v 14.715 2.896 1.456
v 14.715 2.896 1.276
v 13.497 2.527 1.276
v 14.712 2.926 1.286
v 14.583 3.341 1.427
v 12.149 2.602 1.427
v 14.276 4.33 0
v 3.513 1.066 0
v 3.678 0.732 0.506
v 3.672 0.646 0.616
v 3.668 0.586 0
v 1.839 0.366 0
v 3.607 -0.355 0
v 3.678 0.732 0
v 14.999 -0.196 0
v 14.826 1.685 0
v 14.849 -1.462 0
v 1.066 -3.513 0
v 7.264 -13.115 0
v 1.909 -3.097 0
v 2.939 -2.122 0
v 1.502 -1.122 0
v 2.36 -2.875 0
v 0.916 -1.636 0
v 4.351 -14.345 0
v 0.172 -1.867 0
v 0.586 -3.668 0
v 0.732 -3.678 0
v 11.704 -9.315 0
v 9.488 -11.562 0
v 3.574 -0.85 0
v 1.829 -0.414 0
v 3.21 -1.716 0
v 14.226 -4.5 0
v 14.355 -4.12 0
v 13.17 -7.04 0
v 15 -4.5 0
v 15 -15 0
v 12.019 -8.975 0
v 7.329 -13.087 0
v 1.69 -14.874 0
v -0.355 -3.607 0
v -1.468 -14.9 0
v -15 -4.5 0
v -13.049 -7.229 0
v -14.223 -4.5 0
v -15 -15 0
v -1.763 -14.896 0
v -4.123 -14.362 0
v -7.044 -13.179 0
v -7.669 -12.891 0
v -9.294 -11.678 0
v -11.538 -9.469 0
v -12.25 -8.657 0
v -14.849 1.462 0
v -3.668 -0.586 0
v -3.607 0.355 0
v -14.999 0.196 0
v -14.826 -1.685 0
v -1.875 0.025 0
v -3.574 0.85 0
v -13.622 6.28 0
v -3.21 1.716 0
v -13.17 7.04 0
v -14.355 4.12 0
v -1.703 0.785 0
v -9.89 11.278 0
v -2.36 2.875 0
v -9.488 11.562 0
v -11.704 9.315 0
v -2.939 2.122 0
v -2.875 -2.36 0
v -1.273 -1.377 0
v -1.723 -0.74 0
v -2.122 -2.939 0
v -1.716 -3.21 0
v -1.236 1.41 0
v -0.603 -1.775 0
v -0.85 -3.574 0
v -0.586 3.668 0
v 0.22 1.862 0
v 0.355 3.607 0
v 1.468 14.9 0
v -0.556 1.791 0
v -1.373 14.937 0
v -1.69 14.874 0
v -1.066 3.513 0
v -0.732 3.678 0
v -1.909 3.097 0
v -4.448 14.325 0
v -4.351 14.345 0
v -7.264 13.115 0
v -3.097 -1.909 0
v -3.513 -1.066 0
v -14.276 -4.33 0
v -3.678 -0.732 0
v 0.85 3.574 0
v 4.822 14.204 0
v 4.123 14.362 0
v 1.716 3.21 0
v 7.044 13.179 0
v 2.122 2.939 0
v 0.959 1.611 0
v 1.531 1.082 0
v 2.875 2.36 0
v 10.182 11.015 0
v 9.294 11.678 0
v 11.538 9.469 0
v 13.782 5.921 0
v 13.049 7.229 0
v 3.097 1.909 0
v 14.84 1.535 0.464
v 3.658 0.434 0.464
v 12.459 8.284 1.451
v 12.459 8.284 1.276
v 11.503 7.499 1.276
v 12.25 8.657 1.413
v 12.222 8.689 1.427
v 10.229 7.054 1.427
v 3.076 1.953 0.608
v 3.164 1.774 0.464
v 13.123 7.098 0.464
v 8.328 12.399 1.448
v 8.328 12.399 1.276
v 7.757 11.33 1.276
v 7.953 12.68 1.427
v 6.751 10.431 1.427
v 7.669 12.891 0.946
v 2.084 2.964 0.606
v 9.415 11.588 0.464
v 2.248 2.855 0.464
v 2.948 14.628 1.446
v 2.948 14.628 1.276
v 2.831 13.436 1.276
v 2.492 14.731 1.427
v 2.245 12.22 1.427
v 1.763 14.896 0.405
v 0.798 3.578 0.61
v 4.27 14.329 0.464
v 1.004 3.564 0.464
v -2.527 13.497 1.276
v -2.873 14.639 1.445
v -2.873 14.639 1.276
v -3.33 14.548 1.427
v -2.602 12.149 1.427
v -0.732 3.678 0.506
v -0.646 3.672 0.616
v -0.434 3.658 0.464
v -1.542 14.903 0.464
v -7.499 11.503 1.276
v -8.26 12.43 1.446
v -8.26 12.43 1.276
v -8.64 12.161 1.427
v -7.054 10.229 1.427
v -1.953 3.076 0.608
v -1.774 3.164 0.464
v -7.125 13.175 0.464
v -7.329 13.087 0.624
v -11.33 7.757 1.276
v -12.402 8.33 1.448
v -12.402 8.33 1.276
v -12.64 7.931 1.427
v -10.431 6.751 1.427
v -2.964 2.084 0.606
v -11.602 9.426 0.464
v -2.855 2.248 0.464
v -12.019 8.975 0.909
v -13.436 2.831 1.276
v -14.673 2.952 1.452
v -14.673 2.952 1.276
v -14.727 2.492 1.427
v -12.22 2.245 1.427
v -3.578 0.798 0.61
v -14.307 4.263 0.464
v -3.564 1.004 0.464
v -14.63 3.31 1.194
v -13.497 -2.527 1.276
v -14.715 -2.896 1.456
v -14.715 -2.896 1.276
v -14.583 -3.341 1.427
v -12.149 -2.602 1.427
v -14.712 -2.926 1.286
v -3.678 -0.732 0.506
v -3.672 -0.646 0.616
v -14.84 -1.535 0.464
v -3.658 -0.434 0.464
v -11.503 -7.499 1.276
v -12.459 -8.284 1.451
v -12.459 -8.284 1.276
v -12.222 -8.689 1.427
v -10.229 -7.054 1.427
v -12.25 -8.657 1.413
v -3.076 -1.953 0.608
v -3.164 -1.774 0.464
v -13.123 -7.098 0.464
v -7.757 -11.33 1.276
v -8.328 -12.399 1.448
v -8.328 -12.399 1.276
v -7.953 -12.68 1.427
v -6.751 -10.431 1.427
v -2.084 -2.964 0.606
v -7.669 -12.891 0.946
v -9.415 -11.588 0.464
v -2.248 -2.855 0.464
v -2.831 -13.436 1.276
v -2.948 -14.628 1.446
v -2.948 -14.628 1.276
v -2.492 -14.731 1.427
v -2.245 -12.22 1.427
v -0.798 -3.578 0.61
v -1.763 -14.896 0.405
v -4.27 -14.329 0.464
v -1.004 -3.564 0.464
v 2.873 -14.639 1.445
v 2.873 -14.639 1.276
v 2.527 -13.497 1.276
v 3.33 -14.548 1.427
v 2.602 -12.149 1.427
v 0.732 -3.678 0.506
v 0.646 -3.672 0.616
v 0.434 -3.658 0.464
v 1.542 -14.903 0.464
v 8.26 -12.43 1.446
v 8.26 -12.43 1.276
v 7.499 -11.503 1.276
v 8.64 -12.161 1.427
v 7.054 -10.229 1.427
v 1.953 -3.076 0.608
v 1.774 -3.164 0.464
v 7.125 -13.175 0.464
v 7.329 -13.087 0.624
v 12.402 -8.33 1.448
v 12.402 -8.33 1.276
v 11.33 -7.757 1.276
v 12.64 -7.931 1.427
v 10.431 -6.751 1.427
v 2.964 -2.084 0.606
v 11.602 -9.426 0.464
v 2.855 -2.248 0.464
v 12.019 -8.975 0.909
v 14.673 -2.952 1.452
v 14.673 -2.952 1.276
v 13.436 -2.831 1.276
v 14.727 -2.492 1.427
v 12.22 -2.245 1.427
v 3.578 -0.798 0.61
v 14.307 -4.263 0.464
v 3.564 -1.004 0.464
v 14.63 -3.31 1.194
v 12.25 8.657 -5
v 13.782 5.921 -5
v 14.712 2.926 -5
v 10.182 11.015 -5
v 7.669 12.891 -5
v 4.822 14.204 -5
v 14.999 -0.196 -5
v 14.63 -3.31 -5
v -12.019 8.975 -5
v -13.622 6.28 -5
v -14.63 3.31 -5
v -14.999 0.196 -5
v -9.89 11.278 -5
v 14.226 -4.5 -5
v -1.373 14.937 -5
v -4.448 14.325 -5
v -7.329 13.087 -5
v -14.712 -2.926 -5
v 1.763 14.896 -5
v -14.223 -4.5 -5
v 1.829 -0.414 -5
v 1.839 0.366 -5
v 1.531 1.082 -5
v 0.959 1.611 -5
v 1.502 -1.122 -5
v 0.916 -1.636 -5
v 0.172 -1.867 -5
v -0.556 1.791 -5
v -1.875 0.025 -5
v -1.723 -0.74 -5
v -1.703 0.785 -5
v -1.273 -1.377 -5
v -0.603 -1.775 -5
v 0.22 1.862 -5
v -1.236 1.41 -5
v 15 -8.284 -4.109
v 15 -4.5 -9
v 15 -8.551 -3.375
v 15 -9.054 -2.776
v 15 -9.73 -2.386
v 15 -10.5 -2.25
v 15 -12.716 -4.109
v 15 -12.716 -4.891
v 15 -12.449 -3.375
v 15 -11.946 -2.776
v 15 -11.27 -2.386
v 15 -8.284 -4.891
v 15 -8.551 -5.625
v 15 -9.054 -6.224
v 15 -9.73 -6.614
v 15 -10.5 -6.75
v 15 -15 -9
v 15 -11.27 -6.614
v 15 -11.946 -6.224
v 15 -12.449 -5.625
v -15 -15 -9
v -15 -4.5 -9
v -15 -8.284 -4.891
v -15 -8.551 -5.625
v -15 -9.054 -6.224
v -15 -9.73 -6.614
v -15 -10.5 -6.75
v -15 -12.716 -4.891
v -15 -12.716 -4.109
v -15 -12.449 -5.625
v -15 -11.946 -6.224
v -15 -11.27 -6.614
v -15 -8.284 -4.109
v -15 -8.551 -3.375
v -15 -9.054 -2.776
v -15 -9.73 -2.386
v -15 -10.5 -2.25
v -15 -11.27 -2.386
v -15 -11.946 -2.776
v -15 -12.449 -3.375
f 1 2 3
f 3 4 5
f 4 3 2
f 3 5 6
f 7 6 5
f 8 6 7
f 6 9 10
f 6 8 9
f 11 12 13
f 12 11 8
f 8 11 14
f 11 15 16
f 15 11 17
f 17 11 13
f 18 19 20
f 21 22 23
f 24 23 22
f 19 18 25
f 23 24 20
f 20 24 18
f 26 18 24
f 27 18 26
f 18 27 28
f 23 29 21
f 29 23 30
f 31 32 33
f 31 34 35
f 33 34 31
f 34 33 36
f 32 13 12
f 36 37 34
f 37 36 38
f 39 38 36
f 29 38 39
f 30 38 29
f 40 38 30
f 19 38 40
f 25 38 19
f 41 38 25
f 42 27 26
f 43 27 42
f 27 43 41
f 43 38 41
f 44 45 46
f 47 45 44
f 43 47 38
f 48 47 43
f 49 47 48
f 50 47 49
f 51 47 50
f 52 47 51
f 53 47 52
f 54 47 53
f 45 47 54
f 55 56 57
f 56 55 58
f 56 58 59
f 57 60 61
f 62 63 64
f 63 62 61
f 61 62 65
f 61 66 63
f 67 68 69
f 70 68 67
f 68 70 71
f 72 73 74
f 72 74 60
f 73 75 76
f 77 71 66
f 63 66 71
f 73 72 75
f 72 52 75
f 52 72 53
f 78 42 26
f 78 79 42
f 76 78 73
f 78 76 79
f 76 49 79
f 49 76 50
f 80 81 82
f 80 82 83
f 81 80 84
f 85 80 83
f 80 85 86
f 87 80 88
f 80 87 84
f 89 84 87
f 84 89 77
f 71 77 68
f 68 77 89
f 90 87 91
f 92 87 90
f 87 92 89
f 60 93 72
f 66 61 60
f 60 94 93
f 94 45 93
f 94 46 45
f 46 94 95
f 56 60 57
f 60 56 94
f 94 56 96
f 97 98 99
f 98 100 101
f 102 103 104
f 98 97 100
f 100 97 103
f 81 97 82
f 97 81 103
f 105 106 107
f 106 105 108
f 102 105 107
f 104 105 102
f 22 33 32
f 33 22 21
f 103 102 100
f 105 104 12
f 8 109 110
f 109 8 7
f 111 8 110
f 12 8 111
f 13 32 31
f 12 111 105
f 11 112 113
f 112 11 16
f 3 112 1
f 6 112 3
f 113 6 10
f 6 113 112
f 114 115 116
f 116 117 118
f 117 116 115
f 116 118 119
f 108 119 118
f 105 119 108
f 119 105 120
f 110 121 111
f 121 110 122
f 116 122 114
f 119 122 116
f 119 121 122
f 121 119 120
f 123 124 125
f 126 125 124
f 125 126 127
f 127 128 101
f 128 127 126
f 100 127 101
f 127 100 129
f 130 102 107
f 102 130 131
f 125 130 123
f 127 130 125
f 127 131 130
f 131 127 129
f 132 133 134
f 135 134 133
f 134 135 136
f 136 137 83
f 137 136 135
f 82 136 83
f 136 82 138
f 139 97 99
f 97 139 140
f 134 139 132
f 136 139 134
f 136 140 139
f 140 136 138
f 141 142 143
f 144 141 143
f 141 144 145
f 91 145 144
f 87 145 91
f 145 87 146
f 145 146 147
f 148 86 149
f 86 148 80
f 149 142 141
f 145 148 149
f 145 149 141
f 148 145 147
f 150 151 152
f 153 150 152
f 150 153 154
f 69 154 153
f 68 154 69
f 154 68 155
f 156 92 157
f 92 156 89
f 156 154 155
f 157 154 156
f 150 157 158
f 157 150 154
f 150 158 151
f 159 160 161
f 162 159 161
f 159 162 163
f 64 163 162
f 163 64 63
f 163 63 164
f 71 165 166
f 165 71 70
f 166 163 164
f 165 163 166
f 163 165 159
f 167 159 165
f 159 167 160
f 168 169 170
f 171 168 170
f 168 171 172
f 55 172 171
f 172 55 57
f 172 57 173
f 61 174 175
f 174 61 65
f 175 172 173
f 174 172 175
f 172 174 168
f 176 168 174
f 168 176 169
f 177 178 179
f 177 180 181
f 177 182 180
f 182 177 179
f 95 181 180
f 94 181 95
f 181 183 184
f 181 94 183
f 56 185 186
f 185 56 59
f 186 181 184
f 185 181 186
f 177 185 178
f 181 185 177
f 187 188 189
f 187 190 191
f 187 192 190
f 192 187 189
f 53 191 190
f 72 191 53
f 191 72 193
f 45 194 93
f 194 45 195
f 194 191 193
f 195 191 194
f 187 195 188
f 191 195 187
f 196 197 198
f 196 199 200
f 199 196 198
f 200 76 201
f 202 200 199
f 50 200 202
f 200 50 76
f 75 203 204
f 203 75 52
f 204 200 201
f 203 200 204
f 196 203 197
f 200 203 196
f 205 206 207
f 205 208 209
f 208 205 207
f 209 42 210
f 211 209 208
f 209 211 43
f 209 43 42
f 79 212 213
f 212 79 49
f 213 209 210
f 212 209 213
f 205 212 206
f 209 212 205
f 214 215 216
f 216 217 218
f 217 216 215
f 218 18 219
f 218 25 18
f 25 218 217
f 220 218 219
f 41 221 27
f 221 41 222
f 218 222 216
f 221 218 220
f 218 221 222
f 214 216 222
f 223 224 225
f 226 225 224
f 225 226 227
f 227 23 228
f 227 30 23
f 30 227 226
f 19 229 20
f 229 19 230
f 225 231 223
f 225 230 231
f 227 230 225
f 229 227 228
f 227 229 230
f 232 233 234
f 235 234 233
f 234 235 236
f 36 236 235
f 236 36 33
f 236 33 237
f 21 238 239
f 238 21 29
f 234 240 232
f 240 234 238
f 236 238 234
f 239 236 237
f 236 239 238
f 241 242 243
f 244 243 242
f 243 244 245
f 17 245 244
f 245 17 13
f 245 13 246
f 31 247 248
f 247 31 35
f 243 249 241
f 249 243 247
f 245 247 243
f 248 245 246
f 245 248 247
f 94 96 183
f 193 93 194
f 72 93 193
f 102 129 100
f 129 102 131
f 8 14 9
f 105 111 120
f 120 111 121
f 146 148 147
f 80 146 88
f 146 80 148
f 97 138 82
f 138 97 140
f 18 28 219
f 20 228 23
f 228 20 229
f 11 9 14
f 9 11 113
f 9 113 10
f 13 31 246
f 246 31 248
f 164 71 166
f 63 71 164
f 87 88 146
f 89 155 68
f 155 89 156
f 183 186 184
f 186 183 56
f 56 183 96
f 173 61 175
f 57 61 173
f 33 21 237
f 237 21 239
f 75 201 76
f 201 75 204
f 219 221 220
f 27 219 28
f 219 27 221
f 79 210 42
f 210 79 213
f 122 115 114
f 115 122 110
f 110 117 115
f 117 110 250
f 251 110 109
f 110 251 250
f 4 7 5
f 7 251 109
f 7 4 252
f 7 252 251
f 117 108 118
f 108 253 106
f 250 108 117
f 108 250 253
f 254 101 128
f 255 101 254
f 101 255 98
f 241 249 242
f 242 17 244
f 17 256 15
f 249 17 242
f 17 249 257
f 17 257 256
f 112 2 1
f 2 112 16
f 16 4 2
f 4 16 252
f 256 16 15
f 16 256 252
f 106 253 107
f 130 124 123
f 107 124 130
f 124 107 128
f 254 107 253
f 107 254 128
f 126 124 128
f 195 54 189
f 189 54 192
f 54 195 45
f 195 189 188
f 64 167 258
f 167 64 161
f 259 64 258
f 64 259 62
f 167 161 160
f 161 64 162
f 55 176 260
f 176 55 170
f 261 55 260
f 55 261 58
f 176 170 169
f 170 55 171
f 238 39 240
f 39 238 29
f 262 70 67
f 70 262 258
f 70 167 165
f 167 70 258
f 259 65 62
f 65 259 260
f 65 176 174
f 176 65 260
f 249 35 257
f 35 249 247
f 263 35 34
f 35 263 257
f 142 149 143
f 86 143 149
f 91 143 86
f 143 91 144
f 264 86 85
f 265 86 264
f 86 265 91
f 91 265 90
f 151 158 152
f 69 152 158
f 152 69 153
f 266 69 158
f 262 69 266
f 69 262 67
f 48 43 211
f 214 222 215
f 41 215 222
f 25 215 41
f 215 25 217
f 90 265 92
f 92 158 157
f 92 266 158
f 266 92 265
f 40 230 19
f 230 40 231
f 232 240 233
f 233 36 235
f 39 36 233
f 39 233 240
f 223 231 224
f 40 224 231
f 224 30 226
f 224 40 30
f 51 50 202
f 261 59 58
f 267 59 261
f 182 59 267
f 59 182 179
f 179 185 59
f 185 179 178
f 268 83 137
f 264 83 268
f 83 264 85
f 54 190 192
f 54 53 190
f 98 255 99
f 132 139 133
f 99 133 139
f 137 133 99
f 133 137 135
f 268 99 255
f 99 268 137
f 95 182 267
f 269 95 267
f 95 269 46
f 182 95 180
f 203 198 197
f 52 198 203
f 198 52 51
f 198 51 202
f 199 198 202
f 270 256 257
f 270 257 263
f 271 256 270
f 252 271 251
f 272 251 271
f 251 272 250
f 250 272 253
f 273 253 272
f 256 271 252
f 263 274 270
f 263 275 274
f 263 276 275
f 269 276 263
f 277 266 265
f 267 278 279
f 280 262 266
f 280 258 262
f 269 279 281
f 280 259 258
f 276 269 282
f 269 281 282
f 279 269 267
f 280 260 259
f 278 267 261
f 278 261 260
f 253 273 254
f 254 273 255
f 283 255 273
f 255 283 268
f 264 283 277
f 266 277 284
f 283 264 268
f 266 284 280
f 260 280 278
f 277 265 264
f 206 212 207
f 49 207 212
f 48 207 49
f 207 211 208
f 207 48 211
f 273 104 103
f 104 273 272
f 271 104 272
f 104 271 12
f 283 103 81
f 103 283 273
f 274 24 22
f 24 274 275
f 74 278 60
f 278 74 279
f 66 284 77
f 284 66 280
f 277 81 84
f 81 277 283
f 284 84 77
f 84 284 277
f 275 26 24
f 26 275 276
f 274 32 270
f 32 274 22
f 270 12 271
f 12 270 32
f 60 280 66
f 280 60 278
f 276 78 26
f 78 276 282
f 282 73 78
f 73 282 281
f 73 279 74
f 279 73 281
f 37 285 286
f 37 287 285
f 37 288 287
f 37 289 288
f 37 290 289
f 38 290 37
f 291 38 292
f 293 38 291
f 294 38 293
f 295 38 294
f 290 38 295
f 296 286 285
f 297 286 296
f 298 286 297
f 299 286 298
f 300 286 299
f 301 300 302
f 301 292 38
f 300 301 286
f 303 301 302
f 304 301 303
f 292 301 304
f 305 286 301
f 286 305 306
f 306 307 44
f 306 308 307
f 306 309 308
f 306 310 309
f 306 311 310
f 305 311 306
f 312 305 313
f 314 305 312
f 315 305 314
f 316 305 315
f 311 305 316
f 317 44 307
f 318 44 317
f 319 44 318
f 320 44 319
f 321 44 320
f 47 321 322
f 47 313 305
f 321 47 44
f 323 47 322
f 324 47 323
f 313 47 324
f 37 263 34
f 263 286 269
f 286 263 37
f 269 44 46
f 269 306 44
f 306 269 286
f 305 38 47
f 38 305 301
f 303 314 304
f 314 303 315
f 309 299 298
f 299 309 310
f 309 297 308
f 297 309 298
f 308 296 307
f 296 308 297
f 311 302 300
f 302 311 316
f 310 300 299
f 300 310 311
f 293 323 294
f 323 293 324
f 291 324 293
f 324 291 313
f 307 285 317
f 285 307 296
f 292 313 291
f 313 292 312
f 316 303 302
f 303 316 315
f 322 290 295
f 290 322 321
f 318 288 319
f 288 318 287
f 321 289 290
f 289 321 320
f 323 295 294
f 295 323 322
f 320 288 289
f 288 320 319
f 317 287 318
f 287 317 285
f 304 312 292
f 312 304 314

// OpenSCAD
// file: common.scad
/// Rotate child nodes towards endpoint as if they were placed at the
/// `start` position
module look_at(
     start, ///< Starting position
     end ///< Aim point
     ) {
    rotate([
        -acos((end[2] - start[2]) / norm(start - end)),
        0,
        -atan2(end[0] - start[0], end[1] - start[1])
    ]) {
        children();
    }
}

/// Translate child nodes to start point and rotate them towards end
/// point
module move_look_at(start, end) {
    translate(start) look_at(start, end) {
        children();
    }
}


/// Rotate child nodes so that the vector [0,0,1] (normal to the XY
/// plane) would would point towards `end` point.
module look_at0(end) {
    look_at([ 0, 0, 0 ], [ end[0], end[1], end[2] ]) {
        children();
    }
}


module move_look_at_test() {
    for (i = [0:10:360]) {
        r = 80;
        x = r * cos(i);
        y = r * sin(i);
        move_look_at(start = [ x, y, 0 ], end = [ 0, 0, 0 ]) {
            cylinder(4, 4);
        }
    }

    look_at0([ 1, 2, 10 ]) {
         cylinder(10, 10);
    }
}
// main file
// clang-format off
use <common.scad>;
// clang-format on

teeth_count  = 16;
teeth_length = 15;
teeth_height = 1.5;

center_cutout_r    = 2 - 0.125;
connector_cutour_r = 2.25;
bottom_thickness   = 5;

teeth_angle = 360 / (teeth_count * 2);


module line_bevel(start, end, radius, rot = 180) {
    length        = norm(end - start);
    edge_distance = radius;

    move_look_at(start, end) rotate([ 0, 0, rot ])
        translate([ -edge_distance, -edge_distance, 0 ]) {
        difference() {
            cube([ radius + 1, radius + 1, length ]);
            translate([ 0, 0, -1 ]) {
                cylinder(length + 2, radius, radius, [ 0, 0, 0 ]);
            }
        }
    }
}

module triangle_beveled(angle, height, length) {
    neg_point = [ length, length * tan(angle / 2) ];
    pos_point = [ length, -length * tan(angle / 2) ];

    difference() {
        linear_extrude(height) {
            polygon([ [ 0, 0 ], neg_point, pos_point ]);
        }
        line_bevel(
            start  = [ 0, 0, height ],
            end    = [ neg_point[0], neg_point[1], height ],
            radius = height);

        line_bevel(
            start  = [ 0, 0, height ],
            end    = [ pos_point[0], pos_point[1], height ],
            radius = height,
            rot    = -90);
    }
}


module flat_teeth() {
    difference () {
        for (idx = [0:2:teeth_count * 2]) {
            angle = (360 / (teeth_count * 2)) * idx;
            rotate([ 0, 0, angle ]) {
                triangle_beveled(
                    angle  = 360 / (teeth_count * 2),
                    height = teeth_height,
                    length = teeth_length);
            }
        }
        cylinder(
        teeth_height, 
        r1 = center_cutout_r * 2, 
        r2 = center_cutout_r * 2);
    }
}


module cube_cylinder_cutout(height, radius) {
    difference() {
        translate([ -radius, -radius, 0 ]) {
            cube([ 2 * radius, 2 * radius, height ]);
        }

        translate([ 0, 0, -1 ]) {
            cylinder(height + 2, r1 = radius, r2 = radius);
        }
    }
}


module cutting_cylinder(radius, height) {
    translate([ 0, 0, -1 ]) cylinder(
    height + 2, 
    r1 = radius, 
    r2 = radius,
    $fn = radius * 8
    );
}


module teeth_gear_half() {
    difference() {
        union() {
            flat_teeth();
            translate([ 0, 0, -bottom_thickness ]) {
                cylinder(
                    bottom_thickness,
                    r1 = teeth_length,
                    r2 = teeth_length);
            }
        }
        translate([ 0, 0, -1 ]) //
            cube_cylinder_cutout(2 * bottom_thickness, teeth_length);

        translate([ 0, 0, -bottom_thickness ]) //
            cutting_cylinder(center_cutout_r, 2 * bottom_thickness);
    }
}


module main(even_teeth = true) {
    l             = teeth_length;
    holder_depth  = l * 0.6;
    holder_height = (l - center_cutout_r) * 0.8;
    difference() {
        union() {
            translate([ -l, -l, -holder_depth ]) //
                cube([ 2 * l, holder_height, holder_depth ]);

            if (even_teeth) {
                teeth_gear_half();
            } else {
                rotate([ 0, 0, teeth_angle ]) teeth_gear_half();
            }
        }


        translate([ -l, -holder_height, -holder_depth / 2 ]) //
            rotate([ 0, 90, 0 ])                             //
            cutting_cylinder(connector_cutour_r, 2 * l);
    }
}

main(false);
